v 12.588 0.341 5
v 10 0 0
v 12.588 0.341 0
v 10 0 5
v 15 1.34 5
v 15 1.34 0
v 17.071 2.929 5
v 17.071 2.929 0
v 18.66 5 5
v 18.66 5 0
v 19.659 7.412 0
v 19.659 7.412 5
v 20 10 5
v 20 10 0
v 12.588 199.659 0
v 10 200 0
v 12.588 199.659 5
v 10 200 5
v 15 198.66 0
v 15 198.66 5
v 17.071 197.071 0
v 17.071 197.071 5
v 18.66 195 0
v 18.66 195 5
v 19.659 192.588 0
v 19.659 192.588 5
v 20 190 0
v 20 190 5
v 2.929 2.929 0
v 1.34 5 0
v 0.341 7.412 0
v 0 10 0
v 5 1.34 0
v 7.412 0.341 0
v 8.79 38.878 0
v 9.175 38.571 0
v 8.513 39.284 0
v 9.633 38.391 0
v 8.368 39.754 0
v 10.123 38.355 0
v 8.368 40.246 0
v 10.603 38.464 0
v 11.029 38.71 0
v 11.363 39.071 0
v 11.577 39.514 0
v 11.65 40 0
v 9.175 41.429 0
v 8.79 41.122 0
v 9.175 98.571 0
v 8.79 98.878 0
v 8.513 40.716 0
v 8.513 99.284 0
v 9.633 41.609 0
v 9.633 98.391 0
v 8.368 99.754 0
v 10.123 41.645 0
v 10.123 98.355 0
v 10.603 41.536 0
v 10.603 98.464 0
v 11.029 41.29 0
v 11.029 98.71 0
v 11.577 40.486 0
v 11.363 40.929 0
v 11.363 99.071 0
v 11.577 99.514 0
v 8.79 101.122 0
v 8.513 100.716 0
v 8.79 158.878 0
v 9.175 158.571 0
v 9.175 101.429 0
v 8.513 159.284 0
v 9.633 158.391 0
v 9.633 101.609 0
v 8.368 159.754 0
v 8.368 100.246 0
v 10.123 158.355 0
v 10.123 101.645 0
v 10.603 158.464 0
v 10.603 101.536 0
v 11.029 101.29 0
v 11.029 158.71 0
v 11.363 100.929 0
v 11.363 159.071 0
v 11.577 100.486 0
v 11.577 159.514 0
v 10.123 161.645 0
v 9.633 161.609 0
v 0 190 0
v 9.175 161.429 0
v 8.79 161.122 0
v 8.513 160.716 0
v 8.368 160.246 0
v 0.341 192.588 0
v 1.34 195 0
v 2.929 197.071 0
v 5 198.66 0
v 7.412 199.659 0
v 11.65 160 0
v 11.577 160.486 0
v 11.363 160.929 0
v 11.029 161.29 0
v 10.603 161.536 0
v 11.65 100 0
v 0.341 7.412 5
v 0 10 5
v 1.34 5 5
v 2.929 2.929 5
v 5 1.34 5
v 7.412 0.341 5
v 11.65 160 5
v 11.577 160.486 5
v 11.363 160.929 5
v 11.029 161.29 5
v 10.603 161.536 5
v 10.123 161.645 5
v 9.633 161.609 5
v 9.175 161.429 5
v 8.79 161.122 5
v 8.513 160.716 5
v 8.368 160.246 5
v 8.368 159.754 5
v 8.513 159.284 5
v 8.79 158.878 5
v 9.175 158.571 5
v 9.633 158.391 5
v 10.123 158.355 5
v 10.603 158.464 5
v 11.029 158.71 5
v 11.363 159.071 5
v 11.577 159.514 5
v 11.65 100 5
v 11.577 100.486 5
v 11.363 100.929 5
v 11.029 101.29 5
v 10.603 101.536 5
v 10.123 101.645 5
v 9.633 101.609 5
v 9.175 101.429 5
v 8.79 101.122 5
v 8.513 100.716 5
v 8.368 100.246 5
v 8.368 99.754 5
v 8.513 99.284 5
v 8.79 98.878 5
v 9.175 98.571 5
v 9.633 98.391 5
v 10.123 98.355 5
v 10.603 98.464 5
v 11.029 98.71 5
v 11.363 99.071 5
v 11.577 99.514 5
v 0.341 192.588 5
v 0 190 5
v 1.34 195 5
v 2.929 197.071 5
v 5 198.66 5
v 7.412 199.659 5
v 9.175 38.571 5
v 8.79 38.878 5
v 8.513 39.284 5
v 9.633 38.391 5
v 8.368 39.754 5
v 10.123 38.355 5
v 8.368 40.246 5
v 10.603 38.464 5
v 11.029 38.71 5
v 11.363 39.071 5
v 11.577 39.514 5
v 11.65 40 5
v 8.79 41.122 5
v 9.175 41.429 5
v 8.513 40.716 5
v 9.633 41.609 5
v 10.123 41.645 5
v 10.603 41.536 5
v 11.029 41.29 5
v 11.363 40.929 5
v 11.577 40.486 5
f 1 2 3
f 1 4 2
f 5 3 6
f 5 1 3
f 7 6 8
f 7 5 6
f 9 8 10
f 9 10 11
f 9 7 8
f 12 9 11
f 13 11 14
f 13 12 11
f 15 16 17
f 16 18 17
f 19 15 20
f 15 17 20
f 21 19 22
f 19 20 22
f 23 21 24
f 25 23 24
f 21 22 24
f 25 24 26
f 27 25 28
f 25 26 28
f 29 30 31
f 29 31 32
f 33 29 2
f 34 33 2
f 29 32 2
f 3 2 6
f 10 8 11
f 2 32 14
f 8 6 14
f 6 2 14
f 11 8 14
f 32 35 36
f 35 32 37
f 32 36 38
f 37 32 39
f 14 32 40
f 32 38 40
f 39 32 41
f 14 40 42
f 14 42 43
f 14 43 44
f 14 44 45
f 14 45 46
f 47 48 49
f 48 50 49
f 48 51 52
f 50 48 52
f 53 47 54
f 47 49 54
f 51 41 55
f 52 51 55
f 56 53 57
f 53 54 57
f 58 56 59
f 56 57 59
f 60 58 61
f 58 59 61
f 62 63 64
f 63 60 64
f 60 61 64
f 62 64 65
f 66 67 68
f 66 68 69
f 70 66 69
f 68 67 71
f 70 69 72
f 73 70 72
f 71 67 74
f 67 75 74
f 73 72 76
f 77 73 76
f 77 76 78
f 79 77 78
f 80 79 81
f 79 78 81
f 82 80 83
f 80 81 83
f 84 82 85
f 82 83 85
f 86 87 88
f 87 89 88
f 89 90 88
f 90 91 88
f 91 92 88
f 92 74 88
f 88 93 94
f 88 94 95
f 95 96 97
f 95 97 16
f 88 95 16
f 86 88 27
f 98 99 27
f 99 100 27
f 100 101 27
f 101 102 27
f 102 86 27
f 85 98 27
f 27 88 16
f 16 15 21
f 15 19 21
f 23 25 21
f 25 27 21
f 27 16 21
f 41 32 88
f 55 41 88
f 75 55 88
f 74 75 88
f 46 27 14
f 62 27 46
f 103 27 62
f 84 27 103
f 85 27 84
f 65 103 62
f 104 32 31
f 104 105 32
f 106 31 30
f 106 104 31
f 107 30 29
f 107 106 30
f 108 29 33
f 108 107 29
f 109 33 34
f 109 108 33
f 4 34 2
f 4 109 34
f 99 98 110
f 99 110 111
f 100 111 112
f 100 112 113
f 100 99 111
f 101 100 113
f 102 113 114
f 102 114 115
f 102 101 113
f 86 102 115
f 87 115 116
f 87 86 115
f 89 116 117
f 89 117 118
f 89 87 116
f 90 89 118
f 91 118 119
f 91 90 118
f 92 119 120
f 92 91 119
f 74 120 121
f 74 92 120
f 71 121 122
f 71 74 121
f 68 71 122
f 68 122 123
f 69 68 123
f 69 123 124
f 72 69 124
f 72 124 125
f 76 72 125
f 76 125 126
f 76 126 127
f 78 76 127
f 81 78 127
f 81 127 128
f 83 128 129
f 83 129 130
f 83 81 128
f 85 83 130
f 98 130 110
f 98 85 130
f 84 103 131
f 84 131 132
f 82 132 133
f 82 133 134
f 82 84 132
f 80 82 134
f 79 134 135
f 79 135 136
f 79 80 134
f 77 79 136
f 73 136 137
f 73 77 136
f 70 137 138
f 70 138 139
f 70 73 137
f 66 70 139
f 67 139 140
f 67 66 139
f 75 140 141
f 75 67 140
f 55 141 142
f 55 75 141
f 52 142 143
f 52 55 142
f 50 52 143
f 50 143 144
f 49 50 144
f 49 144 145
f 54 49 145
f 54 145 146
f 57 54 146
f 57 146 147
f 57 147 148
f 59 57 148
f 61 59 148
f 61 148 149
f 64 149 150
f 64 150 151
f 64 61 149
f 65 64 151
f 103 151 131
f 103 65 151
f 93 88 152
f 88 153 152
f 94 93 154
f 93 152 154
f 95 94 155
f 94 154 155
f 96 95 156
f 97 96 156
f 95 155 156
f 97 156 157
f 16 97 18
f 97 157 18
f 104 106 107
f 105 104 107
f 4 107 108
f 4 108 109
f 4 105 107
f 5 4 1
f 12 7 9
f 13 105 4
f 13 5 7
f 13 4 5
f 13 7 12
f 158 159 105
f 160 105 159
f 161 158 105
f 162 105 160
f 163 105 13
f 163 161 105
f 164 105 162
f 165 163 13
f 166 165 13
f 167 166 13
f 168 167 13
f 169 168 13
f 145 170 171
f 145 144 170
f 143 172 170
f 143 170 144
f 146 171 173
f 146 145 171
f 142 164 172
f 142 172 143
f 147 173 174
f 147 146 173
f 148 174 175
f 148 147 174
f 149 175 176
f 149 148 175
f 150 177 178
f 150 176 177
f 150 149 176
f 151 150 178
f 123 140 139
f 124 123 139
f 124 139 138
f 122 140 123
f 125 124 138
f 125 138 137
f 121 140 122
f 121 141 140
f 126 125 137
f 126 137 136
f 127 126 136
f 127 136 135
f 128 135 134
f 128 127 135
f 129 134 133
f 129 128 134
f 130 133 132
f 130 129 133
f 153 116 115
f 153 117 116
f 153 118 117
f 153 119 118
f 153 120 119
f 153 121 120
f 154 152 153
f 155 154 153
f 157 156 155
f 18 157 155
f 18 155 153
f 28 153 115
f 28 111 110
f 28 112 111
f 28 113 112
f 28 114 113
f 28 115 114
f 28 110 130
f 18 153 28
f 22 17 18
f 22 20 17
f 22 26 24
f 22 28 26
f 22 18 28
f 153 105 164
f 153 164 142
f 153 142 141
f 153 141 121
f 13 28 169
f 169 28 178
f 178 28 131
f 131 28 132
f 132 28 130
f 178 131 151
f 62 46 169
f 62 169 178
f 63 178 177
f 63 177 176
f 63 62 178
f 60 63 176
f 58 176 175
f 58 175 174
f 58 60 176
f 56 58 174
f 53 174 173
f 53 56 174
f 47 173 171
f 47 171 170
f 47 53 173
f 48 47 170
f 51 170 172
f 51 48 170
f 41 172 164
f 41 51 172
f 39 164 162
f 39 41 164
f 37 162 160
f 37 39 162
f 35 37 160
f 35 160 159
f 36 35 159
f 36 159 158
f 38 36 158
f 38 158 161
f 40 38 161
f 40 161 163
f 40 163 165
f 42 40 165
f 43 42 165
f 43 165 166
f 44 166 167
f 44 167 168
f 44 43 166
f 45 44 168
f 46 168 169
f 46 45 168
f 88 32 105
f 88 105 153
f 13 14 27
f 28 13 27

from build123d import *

# Parameters (mm, degrees)
SKETCH1_W           = 20
SKETCH1_H           = 200
SKETCH1_R           = 1.65
BOSS_EXTRUDE1_DEPTH = 5
FILLET1_R           = 10


with BuildPart() as part:
    # Sketch1 → Boss-Extrude1 (new body)
    with BuildSketch(Plane.XY):
        with Locations((10, 100)):
            Rectangle(SKETCH1_W, SKETCH1_H)
        with Locations((10, 160)):
            Circle(SKETCH1_R, mode=Mode.SUBTRACT)
        with Locations((10, 100)):
            Circle(SKETCH1_R, mode=Mode.SUBTRACT)
        with Locations((10, 40)):
            Circle(SKETCH1_R, mode=Mode.SUBTRACT)
    extrude(amount=BOSS_EXTRUDE1_DEPTH)

    # Fillet1
    fillet1_edges = [part.edges().sort_by_distance(p)[0] for p in [
        (0, 0, 2.5),
        (20, 0, 2.5),
        (20, 200, 2.5),
        (0, 200, 2.5),
    ]]
    fillet(fillet1_edges, radius=FILLET1_R - 0.0001)  # a hair under: the kernel refuses the full size


solid = part.part
